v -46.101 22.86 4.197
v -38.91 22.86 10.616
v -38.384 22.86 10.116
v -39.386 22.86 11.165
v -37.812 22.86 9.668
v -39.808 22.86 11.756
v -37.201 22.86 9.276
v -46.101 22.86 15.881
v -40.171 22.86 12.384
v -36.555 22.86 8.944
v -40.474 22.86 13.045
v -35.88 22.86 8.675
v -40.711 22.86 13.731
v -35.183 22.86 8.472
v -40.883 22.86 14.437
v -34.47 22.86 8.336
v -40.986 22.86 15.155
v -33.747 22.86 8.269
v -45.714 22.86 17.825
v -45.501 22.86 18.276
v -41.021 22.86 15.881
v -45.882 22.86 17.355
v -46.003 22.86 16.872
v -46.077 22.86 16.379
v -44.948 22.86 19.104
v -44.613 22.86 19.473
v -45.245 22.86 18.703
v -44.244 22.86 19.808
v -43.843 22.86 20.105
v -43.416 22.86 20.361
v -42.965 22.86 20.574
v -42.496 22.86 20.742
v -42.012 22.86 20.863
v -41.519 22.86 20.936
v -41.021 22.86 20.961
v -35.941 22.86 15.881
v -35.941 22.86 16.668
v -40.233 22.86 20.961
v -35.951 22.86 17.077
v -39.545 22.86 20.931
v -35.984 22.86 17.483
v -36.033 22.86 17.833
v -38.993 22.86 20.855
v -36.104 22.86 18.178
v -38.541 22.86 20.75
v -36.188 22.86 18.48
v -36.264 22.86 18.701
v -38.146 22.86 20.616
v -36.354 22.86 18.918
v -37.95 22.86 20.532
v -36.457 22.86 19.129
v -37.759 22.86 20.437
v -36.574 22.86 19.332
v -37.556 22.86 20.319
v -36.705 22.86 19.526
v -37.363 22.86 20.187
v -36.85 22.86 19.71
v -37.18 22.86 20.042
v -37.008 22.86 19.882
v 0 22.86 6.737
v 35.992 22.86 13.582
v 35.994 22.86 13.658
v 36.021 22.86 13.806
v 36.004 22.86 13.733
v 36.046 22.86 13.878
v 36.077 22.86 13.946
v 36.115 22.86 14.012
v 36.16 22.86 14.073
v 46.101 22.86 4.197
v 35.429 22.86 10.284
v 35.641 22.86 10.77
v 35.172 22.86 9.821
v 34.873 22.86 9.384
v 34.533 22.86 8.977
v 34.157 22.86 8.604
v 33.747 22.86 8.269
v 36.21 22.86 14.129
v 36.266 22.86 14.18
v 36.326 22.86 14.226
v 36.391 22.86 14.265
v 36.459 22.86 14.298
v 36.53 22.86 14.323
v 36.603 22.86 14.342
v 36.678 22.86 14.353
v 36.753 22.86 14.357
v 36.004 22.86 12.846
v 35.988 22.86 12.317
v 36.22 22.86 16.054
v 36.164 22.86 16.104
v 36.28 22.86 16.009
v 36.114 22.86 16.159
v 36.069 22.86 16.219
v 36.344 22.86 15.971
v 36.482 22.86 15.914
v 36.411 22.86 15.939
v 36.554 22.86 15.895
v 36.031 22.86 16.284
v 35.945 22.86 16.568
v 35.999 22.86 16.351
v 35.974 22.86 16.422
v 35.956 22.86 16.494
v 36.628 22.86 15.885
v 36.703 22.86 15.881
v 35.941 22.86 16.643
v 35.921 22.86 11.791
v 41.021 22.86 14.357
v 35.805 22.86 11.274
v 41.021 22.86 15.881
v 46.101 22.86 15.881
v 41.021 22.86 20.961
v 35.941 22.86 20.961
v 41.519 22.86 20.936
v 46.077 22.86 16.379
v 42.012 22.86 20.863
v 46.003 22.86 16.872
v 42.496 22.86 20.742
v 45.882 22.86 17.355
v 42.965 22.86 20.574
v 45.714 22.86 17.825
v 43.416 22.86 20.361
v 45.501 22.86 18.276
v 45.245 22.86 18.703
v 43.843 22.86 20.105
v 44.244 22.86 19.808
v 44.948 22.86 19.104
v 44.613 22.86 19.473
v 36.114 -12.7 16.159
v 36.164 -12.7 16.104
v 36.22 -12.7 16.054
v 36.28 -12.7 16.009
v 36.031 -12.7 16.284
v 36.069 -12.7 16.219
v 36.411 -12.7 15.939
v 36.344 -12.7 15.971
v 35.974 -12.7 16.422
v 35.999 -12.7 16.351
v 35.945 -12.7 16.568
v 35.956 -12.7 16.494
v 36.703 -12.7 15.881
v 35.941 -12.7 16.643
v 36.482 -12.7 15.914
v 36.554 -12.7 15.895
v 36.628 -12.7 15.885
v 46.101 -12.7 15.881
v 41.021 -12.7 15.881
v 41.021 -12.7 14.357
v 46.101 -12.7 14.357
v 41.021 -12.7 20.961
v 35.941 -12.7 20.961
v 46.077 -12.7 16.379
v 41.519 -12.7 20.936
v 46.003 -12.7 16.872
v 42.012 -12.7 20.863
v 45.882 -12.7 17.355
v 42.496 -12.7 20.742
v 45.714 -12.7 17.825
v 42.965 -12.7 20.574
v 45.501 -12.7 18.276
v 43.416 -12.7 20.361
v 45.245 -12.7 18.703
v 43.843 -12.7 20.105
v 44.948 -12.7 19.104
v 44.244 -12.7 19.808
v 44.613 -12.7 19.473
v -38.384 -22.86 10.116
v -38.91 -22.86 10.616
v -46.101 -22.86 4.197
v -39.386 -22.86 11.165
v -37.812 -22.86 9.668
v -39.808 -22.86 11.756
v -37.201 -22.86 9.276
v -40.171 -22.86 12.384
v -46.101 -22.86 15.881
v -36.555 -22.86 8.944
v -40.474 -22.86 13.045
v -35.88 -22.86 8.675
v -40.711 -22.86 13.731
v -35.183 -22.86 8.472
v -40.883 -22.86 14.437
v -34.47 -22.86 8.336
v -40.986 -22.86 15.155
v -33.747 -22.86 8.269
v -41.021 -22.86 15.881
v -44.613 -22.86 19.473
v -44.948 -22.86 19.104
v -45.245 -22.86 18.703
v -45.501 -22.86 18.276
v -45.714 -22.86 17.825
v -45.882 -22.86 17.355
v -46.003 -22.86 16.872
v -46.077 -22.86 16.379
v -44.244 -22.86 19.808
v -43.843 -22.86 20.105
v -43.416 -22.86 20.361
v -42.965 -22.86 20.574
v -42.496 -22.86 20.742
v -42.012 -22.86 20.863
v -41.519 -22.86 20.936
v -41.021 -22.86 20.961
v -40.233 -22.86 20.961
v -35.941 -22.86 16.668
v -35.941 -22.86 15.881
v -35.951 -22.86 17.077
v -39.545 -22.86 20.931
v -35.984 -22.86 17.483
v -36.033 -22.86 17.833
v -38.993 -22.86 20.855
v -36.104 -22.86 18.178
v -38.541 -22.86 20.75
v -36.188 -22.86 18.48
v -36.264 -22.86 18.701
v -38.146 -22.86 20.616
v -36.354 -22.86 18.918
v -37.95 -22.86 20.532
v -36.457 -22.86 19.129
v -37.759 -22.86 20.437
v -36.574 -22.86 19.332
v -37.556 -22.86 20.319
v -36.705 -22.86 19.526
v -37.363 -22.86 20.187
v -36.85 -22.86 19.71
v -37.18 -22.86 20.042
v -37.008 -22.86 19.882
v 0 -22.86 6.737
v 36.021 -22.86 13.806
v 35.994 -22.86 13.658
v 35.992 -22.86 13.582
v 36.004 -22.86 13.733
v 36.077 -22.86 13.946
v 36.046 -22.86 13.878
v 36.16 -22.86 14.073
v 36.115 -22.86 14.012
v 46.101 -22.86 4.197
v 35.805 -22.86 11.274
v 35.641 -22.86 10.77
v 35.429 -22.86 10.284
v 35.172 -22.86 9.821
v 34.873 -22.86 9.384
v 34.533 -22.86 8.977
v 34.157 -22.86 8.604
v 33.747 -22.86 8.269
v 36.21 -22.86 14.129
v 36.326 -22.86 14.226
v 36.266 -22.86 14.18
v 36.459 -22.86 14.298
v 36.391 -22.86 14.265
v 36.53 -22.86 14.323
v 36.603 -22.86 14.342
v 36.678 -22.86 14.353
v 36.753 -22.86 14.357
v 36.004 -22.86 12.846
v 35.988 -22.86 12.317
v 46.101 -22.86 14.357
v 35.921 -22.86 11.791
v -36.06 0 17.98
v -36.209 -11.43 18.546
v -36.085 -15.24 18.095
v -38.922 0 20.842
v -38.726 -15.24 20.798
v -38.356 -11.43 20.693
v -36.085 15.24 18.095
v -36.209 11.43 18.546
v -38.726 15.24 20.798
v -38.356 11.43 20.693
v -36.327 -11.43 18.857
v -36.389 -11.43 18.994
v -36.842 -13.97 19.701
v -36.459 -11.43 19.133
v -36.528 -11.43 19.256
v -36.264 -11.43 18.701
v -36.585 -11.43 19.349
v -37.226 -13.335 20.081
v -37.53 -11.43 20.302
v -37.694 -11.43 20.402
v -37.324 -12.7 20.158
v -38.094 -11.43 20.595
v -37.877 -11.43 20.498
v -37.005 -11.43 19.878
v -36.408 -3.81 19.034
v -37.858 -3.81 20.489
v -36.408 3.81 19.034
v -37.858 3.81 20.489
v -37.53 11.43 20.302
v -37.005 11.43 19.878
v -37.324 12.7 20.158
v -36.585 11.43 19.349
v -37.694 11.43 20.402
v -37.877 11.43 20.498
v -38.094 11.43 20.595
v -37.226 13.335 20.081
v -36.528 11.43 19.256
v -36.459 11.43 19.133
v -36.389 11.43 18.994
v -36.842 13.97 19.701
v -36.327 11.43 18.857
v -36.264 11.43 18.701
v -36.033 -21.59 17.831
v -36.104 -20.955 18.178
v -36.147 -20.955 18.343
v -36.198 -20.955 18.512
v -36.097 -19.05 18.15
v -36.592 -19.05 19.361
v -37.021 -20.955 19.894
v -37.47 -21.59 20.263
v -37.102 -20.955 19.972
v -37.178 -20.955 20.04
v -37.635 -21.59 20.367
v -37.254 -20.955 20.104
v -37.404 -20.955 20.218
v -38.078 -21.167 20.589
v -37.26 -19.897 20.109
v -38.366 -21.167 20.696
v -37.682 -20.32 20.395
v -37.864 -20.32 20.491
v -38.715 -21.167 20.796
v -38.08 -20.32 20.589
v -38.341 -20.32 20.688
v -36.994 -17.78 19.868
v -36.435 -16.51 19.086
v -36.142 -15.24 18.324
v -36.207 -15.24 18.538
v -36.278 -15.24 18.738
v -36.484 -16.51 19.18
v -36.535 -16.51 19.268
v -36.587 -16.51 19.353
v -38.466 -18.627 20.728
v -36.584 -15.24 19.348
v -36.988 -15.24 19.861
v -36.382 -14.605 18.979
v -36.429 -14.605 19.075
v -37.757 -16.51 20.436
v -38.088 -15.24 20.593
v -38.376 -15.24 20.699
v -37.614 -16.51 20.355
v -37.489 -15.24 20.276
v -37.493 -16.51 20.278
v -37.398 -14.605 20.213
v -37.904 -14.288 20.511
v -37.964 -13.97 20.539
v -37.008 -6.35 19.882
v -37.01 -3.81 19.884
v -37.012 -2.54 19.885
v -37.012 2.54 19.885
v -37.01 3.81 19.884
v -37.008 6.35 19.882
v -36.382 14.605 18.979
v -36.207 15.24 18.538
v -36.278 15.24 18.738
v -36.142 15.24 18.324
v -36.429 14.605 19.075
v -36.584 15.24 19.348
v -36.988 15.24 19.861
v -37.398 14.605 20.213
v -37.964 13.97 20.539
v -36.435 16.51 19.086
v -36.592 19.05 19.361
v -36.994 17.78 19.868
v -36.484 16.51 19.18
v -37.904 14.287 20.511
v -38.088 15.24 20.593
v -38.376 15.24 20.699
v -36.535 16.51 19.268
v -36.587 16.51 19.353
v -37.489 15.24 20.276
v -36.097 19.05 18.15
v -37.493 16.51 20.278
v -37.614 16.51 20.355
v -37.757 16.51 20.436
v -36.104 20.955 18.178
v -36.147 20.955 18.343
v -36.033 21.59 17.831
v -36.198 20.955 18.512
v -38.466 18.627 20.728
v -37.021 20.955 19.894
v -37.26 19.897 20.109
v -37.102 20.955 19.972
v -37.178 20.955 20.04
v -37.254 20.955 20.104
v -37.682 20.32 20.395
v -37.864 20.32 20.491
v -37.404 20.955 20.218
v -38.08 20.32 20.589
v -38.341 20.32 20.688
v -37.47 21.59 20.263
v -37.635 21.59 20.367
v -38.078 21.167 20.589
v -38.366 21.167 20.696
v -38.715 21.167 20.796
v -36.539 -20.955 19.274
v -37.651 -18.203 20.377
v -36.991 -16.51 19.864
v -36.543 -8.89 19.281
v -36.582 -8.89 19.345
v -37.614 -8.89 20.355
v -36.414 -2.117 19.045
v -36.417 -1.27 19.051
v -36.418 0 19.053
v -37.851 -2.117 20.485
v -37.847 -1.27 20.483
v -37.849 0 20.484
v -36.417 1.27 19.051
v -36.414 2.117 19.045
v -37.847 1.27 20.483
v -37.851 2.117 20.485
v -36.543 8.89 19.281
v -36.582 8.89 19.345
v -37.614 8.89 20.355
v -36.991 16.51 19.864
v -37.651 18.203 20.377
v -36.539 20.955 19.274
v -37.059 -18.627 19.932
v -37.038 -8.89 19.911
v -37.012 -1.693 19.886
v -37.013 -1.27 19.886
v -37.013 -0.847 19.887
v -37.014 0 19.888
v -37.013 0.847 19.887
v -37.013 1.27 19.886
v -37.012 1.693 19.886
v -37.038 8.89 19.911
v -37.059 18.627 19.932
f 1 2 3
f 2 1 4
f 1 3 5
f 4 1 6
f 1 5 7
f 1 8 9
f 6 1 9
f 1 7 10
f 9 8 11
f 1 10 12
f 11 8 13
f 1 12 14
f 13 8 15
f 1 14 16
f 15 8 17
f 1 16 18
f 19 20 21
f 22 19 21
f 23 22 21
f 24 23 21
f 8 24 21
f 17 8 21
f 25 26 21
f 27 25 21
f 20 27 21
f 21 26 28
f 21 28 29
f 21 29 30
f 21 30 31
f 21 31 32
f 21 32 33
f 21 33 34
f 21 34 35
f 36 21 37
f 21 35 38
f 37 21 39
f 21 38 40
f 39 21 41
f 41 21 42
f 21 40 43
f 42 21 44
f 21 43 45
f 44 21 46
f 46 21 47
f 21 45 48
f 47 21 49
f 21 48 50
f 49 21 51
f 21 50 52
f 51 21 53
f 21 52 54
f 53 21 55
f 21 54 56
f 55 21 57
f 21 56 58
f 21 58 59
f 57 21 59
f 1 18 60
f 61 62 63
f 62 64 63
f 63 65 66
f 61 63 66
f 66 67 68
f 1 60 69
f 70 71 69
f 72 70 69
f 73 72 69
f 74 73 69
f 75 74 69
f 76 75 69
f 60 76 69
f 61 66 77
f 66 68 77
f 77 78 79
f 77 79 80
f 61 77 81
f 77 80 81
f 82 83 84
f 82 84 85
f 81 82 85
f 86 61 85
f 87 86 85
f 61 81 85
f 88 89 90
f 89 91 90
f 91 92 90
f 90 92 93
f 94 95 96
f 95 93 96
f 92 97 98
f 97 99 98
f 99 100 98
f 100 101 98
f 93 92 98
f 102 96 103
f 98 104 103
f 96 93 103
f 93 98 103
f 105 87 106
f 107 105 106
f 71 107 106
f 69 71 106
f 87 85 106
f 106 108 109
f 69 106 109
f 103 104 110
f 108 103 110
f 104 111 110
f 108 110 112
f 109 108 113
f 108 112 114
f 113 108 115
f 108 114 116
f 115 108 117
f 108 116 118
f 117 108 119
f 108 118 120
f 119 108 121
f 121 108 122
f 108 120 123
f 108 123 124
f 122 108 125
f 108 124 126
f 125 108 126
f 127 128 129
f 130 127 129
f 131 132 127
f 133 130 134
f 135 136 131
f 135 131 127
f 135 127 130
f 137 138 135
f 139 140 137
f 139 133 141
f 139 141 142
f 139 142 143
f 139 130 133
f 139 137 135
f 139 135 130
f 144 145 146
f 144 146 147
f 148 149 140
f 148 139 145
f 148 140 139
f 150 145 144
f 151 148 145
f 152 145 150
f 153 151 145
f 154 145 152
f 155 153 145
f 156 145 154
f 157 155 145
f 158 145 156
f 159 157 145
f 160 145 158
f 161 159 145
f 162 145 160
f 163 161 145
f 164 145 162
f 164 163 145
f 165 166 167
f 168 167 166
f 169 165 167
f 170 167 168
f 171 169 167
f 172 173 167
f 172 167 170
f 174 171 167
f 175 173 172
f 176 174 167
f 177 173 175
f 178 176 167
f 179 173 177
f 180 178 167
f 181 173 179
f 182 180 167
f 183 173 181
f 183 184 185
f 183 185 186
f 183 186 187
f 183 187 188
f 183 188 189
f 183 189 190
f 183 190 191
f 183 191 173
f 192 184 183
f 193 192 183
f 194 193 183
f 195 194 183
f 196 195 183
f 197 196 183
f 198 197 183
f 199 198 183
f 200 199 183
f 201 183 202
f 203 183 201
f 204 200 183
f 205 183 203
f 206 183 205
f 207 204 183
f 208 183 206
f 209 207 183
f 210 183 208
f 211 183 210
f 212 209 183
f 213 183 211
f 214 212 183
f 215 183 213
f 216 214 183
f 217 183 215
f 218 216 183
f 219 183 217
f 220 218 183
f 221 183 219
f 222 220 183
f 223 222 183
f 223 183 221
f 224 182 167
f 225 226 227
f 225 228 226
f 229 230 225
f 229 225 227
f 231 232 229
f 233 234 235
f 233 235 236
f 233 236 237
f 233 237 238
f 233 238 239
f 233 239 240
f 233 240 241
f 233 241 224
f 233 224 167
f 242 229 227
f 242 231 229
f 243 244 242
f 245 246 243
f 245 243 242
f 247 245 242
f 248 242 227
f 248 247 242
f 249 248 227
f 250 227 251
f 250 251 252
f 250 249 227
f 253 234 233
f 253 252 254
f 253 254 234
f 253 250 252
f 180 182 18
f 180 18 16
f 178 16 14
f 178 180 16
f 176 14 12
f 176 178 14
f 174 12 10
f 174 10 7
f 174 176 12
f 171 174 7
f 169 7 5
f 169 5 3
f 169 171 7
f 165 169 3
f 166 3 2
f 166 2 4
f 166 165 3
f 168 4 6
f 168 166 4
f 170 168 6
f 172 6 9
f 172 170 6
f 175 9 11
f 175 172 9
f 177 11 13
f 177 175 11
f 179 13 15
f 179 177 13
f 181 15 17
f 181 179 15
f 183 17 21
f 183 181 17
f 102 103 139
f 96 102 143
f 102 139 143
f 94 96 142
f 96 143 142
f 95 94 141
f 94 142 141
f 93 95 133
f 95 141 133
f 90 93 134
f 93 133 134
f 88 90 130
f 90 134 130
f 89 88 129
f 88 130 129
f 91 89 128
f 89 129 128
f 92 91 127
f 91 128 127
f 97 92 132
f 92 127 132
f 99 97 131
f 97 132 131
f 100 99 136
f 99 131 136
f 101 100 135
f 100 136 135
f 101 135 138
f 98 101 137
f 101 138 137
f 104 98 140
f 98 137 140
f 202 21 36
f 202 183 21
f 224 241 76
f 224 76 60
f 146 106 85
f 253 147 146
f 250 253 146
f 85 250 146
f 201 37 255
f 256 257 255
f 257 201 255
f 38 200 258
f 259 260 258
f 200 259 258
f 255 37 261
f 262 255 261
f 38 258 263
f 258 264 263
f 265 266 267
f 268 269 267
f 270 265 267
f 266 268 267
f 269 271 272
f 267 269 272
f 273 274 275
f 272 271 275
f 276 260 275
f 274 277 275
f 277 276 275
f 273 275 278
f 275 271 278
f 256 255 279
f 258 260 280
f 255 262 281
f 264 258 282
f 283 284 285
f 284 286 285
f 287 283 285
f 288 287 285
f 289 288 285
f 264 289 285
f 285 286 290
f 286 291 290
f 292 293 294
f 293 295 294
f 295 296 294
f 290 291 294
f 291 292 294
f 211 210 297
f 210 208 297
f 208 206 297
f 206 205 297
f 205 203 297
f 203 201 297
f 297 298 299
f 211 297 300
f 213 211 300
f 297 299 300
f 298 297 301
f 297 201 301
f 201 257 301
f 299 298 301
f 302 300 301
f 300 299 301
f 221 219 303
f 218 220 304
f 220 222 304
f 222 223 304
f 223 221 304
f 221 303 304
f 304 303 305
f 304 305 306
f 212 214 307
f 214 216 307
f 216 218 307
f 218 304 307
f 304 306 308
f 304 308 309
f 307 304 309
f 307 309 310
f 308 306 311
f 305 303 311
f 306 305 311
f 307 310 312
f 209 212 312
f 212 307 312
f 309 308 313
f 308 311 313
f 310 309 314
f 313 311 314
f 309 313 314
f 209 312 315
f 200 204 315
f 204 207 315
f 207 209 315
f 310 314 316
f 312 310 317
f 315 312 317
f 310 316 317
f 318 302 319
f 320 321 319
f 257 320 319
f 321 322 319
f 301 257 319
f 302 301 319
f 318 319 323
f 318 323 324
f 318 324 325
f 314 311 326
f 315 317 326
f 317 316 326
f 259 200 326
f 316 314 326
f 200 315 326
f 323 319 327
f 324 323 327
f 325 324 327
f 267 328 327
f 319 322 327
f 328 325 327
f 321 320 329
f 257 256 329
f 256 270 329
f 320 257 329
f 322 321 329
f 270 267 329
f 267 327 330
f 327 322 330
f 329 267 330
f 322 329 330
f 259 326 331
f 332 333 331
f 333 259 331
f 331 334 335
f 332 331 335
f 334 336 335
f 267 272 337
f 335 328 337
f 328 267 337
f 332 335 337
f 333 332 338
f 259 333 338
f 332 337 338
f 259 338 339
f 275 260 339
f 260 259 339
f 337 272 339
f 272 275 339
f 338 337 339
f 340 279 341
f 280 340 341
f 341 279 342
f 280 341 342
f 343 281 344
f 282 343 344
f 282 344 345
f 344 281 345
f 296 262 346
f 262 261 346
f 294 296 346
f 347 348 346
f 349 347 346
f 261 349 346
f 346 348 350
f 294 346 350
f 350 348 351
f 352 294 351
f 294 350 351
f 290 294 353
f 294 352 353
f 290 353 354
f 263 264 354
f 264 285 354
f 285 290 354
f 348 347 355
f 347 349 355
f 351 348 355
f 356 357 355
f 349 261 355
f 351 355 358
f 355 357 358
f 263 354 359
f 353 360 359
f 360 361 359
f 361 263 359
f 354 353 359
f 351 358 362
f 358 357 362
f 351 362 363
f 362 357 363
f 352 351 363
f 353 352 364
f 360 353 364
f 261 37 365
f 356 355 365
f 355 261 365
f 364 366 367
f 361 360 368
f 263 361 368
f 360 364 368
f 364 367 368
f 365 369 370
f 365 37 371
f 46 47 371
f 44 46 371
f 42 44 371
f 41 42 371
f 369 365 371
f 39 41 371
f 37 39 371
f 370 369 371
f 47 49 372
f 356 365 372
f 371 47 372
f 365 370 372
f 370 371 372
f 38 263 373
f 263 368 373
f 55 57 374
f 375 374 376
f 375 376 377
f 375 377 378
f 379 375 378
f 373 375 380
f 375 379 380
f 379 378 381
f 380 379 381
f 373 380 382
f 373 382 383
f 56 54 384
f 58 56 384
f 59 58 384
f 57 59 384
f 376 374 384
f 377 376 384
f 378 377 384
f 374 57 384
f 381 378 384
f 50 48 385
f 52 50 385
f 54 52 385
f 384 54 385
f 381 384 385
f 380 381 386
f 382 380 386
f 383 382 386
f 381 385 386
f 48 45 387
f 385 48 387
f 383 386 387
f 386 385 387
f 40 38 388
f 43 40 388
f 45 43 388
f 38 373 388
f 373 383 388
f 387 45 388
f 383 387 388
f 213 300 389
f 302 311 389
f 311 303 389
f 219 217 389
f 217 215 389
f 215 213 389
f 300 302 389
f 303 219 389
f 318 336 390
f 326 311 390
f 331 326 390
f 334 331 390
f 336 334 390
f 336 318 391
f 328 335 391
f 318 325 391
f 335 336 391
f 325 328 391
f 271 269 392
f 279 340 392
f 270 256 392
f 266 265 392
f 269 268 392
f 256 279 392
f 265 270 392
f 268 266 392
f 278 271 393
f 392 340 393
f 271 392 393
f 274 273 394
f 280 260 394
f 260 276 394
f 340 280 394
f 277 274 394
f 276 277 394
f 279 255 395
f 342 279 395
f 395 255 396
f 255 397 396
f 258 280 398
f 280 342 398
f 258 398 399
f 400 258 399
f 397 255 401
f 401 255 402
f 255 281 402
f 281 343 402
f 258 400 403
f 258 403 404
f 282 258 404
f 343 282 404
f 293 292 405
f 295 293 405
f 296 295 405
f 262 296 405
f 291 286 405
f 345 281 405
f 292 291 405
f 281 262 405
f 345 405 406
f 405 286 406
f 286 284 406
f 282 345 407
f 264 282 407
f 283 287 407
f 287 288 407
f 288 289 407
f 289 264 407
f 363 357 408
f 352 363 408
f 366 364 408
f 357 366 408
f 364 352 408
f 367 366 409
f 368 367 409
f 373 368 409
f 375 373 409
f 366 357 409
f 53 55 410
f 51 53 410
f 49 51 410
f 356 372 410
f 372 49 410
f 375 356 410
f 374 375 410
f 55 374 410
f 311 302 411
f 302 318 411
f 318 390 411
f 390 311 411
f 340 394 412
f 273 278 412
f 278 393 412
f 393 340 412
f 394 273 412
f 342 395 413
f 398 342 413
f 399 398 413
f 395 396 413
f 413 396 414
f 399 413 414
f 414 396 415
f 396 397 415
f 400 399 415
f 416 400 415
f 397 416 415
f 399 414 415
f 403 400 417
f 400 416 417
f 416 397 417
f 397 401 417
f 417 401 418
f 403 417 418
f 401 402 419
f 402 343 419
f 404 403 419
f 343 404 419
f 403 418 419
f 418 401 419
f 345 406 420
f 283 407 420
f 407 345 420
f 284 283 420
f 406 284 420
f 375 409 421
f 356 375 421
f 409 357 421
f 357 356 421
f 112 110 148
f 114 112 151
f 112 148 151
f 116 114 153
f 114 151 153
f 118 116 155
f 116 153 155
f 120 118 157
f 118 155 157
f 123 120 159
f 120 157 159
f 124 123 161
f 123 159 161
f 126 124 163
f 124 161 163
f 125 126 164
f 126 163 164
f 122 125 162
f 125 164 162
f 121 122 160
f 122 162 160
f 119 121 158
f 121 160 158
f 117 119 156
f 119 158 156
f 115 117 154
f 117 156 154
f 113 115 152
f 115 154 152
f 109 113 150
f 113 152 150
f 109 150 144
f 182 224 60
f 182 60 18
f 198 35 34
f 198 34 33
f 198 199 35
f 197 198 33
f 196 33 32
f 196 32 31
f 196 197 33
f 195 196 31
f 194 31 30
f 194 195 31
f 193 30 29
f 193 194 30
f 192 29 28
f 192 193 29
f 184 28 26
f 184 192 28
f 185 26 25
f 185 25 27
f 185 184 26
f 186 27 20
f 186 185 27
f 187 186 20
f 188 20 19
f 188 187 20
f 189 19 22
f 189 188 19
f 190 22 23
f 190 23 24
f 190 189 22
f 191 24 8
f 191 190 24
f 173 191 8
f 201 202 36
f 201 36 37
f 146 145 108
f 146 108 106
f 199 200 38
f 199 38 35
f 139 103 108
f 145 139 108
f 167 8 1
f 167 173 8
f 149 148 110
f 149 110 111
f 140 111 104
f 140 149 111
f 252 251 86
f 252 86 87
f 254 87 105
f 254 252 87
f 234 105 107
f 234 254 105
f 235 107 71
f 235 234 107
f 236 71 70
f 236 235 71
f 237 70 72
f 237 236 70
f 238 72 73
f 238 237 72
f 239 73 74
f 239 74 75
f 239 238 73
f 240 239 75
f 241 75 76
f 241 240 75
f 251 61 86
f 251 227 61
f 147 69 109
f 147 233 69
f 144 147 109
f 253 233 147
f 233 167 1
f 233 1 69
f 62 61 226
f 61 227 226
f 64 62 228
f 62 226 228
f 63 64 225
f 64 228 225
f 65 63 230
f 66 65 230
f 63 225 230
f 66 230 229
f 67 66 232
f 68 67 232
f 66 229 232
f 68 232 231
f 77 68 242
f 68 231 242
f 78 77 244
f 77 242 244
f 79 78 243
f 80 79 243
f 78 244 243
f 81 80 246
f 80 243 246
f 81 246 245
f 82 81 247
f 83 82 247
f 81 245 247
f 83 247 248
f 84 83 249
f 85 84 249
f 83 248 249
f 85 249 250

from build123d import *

# Parameters (mm, degrees)
F1_DEPTH    = 22.86
F2_R        = 5.08
F3_R        = 0.762
F4_R        = 0.762
F5_W        = 14.2031247761
F5_H        = 10.16
F6_DEPTH    = 6.604
F7_T1_DEPTH = 67.1823585695


# Not quite as in the source:
# - a fillet or chamfer that OpenCascade refuses, or shapes differently, is made with other operations: its cross-section is extruded or revolved along the edge and cut away or added


with BuildPart() as f1:
    # F0 (on Front) → F1 (new body, symmetric)
    with BuildSketch(Plane.XZ):
        with BuildLine():
            Line((-35.941, 20.9608385392), (-46.101, 20.9608385392))
            Line((-46.101, 20.9608385392), (-46.101, 4.1968385392))
            Line((-46.101, 4.1968385392), (0, 4.1968385392))
            Line((0, 4.1968385392), (46.101, 4.1968385392))
            Line((46.101, 4.1968385392), (46.101, 20.9608385392))
            Line((46.101, 20.9608385392), (35.941, 20.9608385392))
            Line((35.941, 20.9608385392), (35.941, 15.8808385392))
            Line((35.941, 15.8808385392), (41.021, 15.8808385392))
            Line((41.021, 15.8808385392), (41.021, 14.3568385392))
            Line((41.021, 14.3568385392), (35.9785540412, 14.3568385392))
            Line((35.9785540412, 14.3568385392), (36.0038614542, 12.846416393))
            ThreePointArc((36.0038614542, 12.846416393), (35.4291085131, 10.2844081543), (33.7465347616, 8.2686768405))
            Line((33.7465347616, 8.2686768405), (0, 6.7368385392))
            Line((0, 6.7368385392), (-33.7465347616, 8.2686768405))
            ThreePointArc((-33.7465347616, 8.2686768405), (-38.9099642803, 10.6162670887), (-41.021, 15.8808385392))
            Line((-41.021, 15.8808385392), (-35.941, 15.8808385392))
            Line((-35.941, 15.8808385392), (-35.941, 20.9608385392))
        make_face()
    extrude(amount=F1_DEPTH, both=True)

    # F2
    f2_edges = [f1.edges().sort_by_distance(p)[0] for p in [
        (-46.101, 0, 20.960839),
        (46.101, 0, 20.960839),
    ]]
    fillet(f2_edges, radius=F2_R)

    # F3
    f3_edges = [f1.edges().sort_by_distance(p)[0] for p in [
        (35.978554, 0, 14.356839),
    ]]
    fillet(f3_edges, radius=F3_R)

    # F4
    f4_edges = [f1.edges().sort_by_distance(p)[0] for p in [
        (35.941, 0, 15.880839),
    ]]
    fillet(f4_edges, radius=F4_R)

    # F5 (on face) → F6 (cut, through all)
    with BuildSketch(Plane.XY.offset(20.9608385392)):
        with Locations((43.0425623881, -17.78)):
            Rectangle(F5_W, F5_H)
    extrude(amount=-F6_DEPTH, mode=Mode.SUBTRACT)

    # F7: fillet of radius 4.2924717139 on 1 edges, made by hand

    # F7_s2 → F7_t1 (cut)
    with BuildSketch(Plane.XZ.offset(-33.5911792847)):
        with BuildLine():
            add(Edge.make_bspline(
                [(-35.941, 16.6683668253), (-35.941, 20.9608385392), (-40.2334717139, 20.9608385392)],
                knots=[0, 0, 0, 1, 1, 1], degree=2, weights=[1, 1, 1]))
            Line((-40.2334717139, 20.9608385392), (-35.941, 20.9608385392))
            Line((-35.941, 20.9608385392), (-35.941, 16.6683668253))
        make_face()
    extrude(amount=F7_T1_DEPTH, mode=Mode.SUBTRACT)


solid = f1.part
